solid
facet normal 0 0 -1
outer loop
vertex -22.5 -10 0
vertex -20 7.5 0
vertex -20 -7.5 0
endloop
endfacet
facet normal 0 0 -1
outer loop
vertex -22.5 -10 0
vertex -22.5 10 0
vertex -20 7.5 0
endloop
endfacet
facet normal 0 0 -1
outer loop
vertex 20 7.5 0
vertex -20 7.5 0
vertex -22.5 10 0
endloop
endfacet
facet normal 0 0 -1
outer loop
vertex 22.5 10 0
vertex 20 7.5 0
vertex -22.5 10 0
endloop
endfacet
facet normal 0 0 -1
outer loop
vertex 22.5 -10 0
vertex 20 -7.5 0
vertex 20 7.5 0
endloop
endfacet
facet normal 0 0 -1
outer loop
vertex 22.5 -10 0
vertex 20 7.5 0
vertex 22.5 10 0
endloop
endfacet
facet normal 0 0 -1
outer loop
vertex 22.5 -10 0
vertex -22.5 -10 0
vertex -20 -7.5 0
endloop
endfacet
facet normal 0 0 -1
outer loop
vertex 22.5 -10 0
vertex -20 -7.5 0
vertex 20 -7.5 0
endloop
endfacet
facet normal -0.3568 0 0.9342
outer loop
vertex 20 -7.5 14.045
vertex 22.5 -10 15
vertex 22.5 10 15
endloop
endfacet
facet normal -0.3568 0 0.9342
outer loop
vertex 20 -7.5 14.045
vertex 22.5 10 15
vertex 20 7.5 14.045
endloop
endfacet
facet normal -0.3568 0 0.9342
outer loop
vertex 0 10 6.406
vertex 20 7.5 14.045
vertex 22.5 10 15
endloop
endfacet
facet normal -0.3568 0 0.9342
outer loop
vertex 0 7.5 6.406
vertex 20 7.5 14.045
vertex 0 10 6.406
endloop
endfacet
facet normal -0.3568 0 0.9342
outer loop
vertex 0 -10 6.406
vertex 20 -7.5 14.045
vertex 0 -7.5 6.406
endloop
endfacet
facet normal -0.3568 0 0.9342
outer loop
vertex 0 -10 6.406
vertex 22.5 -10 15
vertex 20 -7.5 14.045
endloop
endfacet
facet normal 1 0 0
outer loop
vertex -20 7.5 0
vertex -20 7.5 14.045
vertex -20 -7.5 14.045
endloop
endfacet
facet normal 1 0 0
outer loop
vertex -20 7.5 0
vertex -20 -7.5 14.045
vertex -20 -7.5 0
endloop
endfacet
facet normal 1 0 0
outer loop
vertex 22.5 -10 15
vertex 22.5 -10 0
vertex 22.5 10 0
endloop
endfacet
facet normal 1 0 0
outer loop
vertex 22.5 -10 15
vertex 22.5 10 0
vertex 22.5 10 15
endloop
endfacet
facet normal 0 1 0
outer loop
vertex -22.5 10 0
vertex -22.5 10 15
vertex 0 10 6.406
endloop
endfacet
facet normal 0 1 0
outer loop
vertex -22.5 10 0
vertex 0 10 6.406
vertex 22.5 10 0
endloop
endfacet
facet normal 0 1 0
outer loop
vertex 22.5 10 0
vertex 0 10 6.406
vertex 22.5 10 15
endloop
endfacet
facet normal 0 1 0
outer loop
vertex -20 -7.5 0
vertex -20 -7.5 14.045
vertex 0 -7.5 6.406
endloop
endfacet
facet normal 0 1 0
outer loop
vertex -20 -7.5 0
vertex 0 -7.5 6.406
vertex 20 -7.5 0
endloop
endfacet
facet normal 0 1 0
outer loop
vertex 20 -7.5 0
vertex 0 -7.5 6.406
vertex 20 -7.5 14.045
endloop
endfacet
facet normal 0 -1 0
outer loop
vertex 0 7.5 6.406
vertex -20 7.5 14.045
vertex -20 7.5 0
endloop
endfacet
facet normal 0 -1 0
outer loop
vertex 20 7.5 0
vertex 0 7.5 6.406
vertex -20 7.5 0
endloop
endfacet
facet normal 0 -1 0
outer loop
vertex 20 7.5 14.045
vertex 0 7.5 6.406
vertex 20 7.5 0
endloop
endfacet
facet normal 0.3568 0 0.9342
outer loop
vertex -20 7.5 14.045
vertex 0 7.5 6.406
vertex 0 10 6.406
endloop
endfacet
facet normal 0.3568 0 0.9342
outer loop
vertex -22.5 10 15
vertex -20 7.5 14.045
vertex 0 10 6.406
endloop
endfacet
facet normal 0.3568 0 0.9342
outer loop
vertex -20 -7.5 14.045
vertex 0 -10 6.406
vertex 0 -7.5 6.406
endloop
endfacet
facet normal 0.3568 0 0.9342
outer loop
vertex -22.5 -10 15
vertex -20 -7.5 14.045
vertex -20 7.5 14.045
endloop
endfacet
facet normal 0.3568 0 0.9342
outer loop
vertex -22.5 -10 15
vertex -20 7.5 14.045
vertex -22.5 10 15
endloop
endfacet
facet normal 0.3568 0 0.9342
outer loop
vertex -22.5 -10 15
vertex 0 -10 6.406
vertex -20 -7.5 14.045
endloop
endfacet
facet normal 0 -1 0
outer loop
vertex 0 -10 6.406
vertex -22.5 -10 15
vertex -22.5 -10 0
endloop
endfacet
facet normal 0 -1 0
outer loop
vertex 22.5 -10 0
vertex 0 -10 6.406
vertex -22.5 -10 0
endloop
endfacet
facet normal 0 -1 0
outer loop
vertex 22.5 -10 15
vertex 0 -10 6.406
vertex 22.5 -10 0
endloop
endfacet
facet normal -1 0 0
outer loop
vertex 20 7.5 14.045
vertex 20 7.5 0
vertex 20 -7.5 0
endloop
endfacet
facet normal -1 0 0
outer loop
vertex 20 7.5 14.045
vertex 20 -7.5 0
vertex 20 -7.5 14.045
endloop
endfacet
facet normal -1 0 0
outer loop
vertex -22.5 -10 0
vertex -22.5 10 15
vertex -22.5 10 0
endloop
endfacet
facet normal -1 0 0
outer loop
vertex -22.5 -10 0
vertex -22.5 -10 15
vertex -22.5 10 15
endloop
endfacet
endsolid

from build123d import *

# Parameters (mm, degrees)
F1_DEPTH      = 10
F1_DEPTH_BACK = 10
F2_T          = -2.5


with BuildPart() as f1:
    # F0 (on Front) → F1 (new body, two sides)
    with BuildSketch(Plane.XZ) as f1_sk:
        Polygon((-22.5, 15), (-22.5, 0), (22.5, 0), (22.5, 15), (0, 6.405836), align=None)
    extrude(amount=F1_DEPTH)
    extrude(f1_sk.sketch, amount=-F1_DEPTH_BACK)

    # F2
    f2_openings = [f1.faces().sort_by_distance(p)[0] for p in [
        (0, 0, 0),
        (-11.25, 0, 10.702918),
        (11.25, 0, 10.702918),
    ]]
    offset(amount=F2_T, openings=f2_openings)


solid = f1.part
